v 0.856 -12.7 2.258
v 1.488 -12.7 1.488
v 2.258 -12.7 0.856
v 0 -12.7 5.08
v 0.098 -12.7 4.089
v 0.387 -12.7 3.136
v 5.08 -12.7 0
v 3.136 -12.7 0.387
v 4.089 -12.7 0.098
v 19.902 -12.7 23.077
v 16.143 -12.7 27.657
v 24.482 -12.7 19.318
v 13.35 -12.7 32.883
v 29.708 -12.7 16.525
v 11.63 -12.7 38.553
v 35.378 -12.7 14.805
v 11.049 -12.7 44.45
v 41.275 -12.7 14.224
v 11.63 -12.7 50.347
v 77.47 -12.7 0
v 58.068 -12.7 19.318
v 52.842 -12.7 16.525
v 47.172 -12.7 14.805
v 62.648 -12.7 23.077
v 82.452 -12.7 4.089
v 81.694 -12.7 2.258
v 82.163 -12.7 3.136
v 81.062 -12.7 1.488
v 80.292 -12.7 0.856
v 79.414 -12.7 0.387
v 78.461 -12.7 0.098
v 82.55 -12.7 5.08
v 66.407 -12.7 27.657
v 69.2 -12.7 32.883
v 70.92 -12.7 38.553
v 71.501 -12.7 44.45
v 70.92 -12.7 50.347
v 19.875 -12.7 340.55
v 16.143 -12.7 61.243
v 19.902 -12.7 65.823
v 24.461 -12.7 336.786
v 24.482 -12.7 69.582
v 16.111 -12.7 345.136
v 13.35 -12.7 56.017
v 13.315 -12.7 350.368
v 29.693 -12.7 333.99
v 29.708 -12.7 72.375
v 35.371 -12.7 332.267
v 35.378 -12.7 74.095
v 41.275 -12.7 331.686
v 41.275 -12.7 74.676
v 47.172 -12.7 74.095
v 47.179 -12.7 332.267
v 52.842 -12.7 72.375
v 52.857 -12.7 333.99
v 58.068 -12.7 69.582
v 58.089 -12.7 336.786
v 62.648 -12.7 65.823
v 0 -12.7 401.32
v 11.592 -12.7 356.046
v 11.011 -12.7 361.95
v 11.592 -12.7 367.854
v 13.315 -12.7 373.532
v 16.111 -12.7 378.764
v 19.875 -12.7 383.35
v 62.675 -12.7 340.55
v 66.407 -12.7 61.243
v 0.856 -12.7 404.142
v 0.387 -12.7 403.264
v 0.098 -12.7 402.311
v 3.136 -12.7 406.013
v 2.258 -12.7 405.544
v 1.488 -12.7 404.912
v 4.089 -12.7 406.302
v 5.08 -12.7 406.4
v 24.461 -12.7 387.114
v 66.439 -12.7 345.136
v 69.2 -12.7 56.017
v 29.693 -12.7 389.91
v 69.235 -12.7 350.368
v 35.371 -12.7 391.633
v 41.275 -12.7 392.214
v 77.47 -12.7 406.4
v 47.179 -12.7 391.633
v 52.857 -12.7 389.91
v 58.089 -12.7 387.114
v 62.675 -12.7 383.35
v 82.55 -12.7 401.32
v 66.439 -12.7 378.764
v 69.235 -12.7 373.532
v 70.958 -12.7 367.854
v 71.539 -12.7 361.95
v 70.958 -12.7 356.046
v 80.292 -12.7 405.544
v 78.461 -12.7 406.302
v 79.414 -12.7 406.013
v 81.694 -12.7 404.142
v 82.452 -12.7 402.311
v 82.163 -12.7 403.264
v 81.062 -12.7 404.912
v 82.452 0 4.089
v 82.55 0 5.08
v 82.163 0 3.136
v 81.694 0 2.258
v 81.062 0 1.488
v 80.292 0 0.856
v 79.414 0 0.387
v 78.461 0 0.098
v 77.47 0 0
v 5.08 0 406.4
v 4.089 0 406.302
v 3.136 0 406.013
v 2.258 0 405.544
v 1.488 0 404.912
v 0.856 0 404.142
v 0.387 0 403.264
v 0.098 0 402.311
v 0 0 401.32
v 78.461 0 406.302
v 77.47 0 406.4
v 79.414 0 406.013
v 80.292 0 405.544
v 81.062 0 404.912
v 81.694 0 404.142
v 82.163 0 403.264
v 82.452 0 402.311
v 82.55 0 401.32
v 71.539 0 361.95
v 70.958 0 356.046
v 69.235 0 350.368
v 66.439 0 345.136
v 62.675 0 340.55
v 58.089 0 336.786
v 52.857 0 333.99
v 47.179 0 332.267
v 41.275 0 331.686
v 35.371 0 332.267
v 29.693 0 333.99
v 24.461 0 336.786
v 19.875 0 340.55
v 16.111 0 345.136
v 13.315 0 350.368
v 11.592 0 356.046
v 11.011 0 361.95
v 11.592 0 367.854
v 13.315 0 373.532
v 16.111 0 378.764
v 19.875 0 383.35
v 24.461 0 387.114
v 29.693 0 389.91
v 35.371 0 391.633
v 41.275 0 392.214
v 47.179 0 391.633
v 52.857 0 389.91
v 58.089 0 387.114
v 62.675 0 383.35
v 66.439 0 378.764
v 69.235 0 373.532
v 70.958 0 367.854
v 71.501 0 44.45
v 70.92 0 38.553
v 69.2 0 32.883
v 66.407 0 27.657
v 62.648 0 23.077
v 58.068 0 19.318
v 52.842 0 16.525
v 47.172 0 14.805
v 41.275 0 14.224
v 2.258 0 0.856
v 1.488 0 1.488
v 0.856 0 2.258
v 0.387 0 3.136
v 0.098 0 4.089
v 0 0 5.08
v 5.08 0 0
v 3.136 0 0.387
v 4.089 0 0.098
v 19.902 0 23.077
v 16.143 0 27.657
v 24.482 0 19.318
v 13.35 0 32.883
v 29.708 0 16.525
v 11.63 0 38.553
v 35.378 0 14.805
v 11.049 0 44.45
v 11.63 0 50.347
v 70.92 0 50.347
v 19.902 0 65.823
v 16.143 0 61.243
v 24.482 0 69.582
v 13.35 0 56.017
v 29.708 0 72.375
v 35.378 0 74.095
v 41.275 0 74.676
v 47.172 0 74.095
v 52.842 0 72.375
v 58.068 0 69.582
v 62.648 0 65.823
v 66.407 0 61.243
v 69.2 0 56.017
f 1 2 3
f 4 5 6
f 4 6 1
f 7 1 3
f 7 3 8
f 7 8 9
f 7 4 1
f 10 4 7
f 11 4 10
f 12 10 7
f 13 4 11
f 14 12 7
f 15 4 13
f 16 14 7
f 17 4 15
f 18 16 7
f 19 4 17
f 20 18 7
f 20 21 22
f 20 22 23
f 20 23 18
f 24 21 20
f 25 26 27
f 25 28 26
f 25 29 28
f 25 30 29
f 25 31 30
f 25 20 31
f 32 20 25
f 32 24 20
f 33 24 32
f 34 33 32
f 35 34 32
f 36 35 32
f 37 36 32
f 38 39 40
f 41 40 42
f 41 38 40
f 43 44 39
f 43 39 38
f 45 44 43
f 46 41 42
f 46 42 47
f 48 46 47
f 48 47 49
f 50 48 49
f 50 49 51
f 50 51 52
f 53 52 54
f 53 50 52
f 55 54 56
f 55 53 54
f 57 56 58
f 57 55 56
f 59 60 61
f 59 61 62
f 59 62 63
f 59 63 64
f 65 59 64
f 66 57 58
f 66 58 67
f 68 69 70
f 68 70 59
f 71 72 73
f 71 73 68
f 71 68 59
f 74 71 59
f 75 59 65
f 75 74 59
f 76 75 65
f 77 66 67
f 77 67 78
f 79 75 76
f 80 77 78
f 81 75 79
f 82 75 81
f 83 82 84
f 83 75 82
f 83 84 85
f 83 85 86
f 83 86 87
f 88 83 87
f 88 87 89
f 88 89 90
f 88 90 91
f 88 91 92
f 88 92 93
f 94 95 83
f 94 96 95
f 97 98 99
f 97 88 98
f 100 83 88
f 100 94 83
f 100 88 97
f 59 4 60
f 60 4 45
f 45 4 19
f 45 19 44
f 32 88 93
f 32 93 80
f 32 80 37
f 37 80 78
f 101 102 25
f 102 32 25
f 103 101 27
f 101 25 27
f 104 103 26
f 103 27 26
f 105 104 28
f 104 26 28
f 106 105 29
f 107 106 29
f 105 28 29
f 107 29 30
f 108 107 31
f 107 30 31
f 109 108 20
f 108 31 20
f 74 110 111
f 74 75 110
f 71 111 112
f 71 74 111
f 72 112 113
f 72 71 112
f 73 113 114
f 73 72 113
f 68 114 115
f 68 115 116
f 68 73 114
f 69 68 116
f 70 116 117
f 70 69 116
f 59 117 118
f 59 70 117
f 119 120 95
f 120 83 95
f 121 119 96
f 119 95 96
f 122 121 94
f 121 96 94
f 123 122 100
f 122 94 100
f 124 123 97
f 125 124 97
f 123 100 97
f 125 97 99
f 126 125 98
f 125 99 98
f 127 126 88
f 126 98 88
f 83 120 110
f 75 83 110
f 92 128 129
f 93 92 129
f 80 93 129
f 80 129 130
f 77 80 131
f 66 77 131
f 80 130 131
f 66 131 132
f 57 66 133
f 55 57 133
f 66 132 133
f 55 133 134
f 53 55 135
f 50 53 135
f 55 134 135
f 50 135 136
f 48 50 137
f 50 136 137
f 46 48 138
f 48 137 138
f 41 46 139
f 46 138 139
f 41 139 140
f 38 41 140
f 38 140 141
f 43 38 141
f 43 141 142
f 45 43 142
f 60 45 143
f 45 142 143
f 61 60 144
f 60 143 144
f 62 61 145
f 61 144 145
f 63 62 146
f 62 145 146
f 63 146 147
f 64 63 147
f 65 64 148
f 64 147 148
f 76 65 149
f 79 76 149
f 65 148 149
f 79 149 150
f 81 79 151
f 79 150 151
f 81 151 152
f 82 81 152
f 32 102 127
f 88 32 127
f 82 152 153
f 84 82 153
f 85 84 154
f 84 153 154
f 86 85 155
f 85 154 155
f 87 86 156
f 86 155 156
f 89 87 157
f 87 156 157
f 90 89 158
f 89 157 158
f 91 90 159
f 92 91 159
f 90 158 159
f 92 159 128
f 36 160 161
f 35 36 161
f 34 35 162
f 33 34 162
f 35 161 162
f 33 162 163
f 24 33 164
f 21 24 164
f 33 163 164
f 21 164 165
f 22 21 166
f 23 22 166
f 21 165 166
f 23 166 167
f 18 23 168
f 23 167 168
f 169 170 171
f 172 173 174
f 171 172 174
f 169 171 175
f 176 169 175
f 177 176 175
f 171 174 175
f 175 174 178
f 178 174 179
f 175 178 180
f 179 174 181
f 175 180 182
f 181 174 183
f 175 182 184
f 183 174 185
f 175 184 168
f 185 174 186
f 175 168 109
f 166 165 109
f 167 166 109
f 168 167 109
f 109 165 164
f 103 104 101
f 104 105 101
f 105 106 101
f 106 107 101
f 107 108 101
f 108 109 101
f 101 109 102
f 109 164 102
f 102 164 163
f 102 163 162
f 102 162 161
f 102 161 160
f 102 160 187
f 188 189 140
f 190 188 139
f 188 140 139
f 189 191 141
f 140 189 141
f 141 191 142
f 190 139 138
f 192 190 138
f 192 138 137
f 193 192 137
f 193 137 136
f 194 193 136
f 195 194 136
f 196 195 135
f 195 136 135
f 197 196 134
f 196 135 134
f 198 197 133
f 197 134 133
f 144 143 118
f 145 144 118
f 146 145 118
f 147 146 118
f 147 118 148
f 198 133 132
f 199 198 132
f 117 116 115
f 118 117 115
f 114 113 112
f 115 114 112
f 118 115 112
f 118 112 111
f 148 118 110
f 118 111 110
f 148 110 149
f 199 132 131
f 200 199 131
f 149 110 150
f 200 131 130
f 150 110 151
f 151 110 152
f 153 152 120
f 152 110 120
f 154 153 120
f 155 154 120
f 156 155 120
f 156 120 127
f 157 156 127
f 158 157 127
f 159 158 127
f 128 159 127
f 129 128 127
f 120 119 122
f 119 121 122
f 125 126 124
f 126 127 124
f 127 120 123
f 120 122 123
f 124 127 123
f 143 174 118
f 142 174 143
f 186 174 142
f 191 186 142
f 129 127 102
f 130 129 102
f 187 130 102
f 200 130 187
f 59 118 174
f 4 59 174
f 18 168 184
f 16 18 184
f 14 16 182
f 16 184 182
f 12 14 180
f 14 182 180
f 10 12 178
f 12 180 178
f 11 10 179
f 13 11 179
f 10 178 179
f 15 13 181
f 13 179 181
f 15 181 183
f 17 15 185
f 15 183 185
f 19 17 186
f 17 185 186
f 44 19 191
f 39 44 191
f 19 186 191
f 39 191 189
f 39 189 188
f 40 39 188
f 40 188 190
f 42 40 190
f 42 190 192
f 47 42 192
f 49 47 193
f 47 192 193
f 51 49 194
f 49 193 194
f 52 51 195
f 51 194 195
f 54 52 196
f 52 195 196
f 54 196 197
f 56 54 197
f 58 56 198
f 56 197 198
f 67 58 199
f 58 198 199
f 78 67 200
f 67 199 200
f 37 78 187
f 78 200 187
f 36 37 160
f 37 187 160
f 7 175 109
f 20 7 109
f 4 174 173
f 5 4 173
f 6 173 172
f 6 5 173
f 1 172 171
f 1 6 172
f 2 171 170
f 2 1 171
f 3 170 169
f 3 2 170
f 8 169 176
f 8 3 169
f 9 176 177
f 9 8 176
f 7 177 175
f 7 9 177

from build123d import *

# Parameters (mm, degrees)
F1_DEPTH = 12.7
F2_R     = 5.08
F3_R     = 5.08


with BuildPart() as f1:
    # F0 (on Front) → F1 (new body)
    with BuildSketch(Plane.XZ):
        with BuildLine():
            ThreePointArc((71.501, 44.45), (19.90199, 65.82301), (41.275, 14.224))
            ThreePointArc((41.275, 14.224), (62.64801, 23.07699), (71.501, 44.45))
        make_face()
        with BuildLine():
            ThreePointArc((71.5391, 361.95), (62.67495, 383.34995), (41.275, 392.2141))
            ThreePointArc((41.275, 392.2141), (19.87505, 340.55005), (71.5391, 361.95))
        make_face()
        Polygon((0, 406.4), (0, 0), (41.275, 0), (82.55, 0), (82.55, 406.4), (41.275, 406.4), align=None)
        with BuildLine():
            ThreePointArc((71.501, 44.45), (62.64801, 23.07699), (41.275, 14.224))
            ThreePointArc((41.275, 14.224), (19.90199, 65.82301), (71.501, 44.45))
        make_face(mode=Mode.SUBTRACT)
        with BuildLine():
            ThreePointArc((71.5391, 361.95), (19.87505, 340.55005), (41.275, 392.2141))
            ThreePointArc((41.275, 392.2141), (62.67495, 383.34995), (71.5391, 361.95))
        make_face(mode=Mode.SUBTRACT)
    extrude(amount=F1_DEPTH)

    # F2
    f2_edges = [f1.edges().sort_by_distance(p)[0] for p in [
        (82.55, -6.35, 406.4),
    ]]
    fillet(f2_edges, radius=F2_R)

    # F3
    f3_edges = [f1.edges().sort_by_distance(p)[0] for p in [
        (0, -6.35, 406.4),
        (82.55, -6.35, 0),
        (0, -6.35, 0),
    ]]
    fillet(f3_edges, radius=F3_R)


solid = f1.part
